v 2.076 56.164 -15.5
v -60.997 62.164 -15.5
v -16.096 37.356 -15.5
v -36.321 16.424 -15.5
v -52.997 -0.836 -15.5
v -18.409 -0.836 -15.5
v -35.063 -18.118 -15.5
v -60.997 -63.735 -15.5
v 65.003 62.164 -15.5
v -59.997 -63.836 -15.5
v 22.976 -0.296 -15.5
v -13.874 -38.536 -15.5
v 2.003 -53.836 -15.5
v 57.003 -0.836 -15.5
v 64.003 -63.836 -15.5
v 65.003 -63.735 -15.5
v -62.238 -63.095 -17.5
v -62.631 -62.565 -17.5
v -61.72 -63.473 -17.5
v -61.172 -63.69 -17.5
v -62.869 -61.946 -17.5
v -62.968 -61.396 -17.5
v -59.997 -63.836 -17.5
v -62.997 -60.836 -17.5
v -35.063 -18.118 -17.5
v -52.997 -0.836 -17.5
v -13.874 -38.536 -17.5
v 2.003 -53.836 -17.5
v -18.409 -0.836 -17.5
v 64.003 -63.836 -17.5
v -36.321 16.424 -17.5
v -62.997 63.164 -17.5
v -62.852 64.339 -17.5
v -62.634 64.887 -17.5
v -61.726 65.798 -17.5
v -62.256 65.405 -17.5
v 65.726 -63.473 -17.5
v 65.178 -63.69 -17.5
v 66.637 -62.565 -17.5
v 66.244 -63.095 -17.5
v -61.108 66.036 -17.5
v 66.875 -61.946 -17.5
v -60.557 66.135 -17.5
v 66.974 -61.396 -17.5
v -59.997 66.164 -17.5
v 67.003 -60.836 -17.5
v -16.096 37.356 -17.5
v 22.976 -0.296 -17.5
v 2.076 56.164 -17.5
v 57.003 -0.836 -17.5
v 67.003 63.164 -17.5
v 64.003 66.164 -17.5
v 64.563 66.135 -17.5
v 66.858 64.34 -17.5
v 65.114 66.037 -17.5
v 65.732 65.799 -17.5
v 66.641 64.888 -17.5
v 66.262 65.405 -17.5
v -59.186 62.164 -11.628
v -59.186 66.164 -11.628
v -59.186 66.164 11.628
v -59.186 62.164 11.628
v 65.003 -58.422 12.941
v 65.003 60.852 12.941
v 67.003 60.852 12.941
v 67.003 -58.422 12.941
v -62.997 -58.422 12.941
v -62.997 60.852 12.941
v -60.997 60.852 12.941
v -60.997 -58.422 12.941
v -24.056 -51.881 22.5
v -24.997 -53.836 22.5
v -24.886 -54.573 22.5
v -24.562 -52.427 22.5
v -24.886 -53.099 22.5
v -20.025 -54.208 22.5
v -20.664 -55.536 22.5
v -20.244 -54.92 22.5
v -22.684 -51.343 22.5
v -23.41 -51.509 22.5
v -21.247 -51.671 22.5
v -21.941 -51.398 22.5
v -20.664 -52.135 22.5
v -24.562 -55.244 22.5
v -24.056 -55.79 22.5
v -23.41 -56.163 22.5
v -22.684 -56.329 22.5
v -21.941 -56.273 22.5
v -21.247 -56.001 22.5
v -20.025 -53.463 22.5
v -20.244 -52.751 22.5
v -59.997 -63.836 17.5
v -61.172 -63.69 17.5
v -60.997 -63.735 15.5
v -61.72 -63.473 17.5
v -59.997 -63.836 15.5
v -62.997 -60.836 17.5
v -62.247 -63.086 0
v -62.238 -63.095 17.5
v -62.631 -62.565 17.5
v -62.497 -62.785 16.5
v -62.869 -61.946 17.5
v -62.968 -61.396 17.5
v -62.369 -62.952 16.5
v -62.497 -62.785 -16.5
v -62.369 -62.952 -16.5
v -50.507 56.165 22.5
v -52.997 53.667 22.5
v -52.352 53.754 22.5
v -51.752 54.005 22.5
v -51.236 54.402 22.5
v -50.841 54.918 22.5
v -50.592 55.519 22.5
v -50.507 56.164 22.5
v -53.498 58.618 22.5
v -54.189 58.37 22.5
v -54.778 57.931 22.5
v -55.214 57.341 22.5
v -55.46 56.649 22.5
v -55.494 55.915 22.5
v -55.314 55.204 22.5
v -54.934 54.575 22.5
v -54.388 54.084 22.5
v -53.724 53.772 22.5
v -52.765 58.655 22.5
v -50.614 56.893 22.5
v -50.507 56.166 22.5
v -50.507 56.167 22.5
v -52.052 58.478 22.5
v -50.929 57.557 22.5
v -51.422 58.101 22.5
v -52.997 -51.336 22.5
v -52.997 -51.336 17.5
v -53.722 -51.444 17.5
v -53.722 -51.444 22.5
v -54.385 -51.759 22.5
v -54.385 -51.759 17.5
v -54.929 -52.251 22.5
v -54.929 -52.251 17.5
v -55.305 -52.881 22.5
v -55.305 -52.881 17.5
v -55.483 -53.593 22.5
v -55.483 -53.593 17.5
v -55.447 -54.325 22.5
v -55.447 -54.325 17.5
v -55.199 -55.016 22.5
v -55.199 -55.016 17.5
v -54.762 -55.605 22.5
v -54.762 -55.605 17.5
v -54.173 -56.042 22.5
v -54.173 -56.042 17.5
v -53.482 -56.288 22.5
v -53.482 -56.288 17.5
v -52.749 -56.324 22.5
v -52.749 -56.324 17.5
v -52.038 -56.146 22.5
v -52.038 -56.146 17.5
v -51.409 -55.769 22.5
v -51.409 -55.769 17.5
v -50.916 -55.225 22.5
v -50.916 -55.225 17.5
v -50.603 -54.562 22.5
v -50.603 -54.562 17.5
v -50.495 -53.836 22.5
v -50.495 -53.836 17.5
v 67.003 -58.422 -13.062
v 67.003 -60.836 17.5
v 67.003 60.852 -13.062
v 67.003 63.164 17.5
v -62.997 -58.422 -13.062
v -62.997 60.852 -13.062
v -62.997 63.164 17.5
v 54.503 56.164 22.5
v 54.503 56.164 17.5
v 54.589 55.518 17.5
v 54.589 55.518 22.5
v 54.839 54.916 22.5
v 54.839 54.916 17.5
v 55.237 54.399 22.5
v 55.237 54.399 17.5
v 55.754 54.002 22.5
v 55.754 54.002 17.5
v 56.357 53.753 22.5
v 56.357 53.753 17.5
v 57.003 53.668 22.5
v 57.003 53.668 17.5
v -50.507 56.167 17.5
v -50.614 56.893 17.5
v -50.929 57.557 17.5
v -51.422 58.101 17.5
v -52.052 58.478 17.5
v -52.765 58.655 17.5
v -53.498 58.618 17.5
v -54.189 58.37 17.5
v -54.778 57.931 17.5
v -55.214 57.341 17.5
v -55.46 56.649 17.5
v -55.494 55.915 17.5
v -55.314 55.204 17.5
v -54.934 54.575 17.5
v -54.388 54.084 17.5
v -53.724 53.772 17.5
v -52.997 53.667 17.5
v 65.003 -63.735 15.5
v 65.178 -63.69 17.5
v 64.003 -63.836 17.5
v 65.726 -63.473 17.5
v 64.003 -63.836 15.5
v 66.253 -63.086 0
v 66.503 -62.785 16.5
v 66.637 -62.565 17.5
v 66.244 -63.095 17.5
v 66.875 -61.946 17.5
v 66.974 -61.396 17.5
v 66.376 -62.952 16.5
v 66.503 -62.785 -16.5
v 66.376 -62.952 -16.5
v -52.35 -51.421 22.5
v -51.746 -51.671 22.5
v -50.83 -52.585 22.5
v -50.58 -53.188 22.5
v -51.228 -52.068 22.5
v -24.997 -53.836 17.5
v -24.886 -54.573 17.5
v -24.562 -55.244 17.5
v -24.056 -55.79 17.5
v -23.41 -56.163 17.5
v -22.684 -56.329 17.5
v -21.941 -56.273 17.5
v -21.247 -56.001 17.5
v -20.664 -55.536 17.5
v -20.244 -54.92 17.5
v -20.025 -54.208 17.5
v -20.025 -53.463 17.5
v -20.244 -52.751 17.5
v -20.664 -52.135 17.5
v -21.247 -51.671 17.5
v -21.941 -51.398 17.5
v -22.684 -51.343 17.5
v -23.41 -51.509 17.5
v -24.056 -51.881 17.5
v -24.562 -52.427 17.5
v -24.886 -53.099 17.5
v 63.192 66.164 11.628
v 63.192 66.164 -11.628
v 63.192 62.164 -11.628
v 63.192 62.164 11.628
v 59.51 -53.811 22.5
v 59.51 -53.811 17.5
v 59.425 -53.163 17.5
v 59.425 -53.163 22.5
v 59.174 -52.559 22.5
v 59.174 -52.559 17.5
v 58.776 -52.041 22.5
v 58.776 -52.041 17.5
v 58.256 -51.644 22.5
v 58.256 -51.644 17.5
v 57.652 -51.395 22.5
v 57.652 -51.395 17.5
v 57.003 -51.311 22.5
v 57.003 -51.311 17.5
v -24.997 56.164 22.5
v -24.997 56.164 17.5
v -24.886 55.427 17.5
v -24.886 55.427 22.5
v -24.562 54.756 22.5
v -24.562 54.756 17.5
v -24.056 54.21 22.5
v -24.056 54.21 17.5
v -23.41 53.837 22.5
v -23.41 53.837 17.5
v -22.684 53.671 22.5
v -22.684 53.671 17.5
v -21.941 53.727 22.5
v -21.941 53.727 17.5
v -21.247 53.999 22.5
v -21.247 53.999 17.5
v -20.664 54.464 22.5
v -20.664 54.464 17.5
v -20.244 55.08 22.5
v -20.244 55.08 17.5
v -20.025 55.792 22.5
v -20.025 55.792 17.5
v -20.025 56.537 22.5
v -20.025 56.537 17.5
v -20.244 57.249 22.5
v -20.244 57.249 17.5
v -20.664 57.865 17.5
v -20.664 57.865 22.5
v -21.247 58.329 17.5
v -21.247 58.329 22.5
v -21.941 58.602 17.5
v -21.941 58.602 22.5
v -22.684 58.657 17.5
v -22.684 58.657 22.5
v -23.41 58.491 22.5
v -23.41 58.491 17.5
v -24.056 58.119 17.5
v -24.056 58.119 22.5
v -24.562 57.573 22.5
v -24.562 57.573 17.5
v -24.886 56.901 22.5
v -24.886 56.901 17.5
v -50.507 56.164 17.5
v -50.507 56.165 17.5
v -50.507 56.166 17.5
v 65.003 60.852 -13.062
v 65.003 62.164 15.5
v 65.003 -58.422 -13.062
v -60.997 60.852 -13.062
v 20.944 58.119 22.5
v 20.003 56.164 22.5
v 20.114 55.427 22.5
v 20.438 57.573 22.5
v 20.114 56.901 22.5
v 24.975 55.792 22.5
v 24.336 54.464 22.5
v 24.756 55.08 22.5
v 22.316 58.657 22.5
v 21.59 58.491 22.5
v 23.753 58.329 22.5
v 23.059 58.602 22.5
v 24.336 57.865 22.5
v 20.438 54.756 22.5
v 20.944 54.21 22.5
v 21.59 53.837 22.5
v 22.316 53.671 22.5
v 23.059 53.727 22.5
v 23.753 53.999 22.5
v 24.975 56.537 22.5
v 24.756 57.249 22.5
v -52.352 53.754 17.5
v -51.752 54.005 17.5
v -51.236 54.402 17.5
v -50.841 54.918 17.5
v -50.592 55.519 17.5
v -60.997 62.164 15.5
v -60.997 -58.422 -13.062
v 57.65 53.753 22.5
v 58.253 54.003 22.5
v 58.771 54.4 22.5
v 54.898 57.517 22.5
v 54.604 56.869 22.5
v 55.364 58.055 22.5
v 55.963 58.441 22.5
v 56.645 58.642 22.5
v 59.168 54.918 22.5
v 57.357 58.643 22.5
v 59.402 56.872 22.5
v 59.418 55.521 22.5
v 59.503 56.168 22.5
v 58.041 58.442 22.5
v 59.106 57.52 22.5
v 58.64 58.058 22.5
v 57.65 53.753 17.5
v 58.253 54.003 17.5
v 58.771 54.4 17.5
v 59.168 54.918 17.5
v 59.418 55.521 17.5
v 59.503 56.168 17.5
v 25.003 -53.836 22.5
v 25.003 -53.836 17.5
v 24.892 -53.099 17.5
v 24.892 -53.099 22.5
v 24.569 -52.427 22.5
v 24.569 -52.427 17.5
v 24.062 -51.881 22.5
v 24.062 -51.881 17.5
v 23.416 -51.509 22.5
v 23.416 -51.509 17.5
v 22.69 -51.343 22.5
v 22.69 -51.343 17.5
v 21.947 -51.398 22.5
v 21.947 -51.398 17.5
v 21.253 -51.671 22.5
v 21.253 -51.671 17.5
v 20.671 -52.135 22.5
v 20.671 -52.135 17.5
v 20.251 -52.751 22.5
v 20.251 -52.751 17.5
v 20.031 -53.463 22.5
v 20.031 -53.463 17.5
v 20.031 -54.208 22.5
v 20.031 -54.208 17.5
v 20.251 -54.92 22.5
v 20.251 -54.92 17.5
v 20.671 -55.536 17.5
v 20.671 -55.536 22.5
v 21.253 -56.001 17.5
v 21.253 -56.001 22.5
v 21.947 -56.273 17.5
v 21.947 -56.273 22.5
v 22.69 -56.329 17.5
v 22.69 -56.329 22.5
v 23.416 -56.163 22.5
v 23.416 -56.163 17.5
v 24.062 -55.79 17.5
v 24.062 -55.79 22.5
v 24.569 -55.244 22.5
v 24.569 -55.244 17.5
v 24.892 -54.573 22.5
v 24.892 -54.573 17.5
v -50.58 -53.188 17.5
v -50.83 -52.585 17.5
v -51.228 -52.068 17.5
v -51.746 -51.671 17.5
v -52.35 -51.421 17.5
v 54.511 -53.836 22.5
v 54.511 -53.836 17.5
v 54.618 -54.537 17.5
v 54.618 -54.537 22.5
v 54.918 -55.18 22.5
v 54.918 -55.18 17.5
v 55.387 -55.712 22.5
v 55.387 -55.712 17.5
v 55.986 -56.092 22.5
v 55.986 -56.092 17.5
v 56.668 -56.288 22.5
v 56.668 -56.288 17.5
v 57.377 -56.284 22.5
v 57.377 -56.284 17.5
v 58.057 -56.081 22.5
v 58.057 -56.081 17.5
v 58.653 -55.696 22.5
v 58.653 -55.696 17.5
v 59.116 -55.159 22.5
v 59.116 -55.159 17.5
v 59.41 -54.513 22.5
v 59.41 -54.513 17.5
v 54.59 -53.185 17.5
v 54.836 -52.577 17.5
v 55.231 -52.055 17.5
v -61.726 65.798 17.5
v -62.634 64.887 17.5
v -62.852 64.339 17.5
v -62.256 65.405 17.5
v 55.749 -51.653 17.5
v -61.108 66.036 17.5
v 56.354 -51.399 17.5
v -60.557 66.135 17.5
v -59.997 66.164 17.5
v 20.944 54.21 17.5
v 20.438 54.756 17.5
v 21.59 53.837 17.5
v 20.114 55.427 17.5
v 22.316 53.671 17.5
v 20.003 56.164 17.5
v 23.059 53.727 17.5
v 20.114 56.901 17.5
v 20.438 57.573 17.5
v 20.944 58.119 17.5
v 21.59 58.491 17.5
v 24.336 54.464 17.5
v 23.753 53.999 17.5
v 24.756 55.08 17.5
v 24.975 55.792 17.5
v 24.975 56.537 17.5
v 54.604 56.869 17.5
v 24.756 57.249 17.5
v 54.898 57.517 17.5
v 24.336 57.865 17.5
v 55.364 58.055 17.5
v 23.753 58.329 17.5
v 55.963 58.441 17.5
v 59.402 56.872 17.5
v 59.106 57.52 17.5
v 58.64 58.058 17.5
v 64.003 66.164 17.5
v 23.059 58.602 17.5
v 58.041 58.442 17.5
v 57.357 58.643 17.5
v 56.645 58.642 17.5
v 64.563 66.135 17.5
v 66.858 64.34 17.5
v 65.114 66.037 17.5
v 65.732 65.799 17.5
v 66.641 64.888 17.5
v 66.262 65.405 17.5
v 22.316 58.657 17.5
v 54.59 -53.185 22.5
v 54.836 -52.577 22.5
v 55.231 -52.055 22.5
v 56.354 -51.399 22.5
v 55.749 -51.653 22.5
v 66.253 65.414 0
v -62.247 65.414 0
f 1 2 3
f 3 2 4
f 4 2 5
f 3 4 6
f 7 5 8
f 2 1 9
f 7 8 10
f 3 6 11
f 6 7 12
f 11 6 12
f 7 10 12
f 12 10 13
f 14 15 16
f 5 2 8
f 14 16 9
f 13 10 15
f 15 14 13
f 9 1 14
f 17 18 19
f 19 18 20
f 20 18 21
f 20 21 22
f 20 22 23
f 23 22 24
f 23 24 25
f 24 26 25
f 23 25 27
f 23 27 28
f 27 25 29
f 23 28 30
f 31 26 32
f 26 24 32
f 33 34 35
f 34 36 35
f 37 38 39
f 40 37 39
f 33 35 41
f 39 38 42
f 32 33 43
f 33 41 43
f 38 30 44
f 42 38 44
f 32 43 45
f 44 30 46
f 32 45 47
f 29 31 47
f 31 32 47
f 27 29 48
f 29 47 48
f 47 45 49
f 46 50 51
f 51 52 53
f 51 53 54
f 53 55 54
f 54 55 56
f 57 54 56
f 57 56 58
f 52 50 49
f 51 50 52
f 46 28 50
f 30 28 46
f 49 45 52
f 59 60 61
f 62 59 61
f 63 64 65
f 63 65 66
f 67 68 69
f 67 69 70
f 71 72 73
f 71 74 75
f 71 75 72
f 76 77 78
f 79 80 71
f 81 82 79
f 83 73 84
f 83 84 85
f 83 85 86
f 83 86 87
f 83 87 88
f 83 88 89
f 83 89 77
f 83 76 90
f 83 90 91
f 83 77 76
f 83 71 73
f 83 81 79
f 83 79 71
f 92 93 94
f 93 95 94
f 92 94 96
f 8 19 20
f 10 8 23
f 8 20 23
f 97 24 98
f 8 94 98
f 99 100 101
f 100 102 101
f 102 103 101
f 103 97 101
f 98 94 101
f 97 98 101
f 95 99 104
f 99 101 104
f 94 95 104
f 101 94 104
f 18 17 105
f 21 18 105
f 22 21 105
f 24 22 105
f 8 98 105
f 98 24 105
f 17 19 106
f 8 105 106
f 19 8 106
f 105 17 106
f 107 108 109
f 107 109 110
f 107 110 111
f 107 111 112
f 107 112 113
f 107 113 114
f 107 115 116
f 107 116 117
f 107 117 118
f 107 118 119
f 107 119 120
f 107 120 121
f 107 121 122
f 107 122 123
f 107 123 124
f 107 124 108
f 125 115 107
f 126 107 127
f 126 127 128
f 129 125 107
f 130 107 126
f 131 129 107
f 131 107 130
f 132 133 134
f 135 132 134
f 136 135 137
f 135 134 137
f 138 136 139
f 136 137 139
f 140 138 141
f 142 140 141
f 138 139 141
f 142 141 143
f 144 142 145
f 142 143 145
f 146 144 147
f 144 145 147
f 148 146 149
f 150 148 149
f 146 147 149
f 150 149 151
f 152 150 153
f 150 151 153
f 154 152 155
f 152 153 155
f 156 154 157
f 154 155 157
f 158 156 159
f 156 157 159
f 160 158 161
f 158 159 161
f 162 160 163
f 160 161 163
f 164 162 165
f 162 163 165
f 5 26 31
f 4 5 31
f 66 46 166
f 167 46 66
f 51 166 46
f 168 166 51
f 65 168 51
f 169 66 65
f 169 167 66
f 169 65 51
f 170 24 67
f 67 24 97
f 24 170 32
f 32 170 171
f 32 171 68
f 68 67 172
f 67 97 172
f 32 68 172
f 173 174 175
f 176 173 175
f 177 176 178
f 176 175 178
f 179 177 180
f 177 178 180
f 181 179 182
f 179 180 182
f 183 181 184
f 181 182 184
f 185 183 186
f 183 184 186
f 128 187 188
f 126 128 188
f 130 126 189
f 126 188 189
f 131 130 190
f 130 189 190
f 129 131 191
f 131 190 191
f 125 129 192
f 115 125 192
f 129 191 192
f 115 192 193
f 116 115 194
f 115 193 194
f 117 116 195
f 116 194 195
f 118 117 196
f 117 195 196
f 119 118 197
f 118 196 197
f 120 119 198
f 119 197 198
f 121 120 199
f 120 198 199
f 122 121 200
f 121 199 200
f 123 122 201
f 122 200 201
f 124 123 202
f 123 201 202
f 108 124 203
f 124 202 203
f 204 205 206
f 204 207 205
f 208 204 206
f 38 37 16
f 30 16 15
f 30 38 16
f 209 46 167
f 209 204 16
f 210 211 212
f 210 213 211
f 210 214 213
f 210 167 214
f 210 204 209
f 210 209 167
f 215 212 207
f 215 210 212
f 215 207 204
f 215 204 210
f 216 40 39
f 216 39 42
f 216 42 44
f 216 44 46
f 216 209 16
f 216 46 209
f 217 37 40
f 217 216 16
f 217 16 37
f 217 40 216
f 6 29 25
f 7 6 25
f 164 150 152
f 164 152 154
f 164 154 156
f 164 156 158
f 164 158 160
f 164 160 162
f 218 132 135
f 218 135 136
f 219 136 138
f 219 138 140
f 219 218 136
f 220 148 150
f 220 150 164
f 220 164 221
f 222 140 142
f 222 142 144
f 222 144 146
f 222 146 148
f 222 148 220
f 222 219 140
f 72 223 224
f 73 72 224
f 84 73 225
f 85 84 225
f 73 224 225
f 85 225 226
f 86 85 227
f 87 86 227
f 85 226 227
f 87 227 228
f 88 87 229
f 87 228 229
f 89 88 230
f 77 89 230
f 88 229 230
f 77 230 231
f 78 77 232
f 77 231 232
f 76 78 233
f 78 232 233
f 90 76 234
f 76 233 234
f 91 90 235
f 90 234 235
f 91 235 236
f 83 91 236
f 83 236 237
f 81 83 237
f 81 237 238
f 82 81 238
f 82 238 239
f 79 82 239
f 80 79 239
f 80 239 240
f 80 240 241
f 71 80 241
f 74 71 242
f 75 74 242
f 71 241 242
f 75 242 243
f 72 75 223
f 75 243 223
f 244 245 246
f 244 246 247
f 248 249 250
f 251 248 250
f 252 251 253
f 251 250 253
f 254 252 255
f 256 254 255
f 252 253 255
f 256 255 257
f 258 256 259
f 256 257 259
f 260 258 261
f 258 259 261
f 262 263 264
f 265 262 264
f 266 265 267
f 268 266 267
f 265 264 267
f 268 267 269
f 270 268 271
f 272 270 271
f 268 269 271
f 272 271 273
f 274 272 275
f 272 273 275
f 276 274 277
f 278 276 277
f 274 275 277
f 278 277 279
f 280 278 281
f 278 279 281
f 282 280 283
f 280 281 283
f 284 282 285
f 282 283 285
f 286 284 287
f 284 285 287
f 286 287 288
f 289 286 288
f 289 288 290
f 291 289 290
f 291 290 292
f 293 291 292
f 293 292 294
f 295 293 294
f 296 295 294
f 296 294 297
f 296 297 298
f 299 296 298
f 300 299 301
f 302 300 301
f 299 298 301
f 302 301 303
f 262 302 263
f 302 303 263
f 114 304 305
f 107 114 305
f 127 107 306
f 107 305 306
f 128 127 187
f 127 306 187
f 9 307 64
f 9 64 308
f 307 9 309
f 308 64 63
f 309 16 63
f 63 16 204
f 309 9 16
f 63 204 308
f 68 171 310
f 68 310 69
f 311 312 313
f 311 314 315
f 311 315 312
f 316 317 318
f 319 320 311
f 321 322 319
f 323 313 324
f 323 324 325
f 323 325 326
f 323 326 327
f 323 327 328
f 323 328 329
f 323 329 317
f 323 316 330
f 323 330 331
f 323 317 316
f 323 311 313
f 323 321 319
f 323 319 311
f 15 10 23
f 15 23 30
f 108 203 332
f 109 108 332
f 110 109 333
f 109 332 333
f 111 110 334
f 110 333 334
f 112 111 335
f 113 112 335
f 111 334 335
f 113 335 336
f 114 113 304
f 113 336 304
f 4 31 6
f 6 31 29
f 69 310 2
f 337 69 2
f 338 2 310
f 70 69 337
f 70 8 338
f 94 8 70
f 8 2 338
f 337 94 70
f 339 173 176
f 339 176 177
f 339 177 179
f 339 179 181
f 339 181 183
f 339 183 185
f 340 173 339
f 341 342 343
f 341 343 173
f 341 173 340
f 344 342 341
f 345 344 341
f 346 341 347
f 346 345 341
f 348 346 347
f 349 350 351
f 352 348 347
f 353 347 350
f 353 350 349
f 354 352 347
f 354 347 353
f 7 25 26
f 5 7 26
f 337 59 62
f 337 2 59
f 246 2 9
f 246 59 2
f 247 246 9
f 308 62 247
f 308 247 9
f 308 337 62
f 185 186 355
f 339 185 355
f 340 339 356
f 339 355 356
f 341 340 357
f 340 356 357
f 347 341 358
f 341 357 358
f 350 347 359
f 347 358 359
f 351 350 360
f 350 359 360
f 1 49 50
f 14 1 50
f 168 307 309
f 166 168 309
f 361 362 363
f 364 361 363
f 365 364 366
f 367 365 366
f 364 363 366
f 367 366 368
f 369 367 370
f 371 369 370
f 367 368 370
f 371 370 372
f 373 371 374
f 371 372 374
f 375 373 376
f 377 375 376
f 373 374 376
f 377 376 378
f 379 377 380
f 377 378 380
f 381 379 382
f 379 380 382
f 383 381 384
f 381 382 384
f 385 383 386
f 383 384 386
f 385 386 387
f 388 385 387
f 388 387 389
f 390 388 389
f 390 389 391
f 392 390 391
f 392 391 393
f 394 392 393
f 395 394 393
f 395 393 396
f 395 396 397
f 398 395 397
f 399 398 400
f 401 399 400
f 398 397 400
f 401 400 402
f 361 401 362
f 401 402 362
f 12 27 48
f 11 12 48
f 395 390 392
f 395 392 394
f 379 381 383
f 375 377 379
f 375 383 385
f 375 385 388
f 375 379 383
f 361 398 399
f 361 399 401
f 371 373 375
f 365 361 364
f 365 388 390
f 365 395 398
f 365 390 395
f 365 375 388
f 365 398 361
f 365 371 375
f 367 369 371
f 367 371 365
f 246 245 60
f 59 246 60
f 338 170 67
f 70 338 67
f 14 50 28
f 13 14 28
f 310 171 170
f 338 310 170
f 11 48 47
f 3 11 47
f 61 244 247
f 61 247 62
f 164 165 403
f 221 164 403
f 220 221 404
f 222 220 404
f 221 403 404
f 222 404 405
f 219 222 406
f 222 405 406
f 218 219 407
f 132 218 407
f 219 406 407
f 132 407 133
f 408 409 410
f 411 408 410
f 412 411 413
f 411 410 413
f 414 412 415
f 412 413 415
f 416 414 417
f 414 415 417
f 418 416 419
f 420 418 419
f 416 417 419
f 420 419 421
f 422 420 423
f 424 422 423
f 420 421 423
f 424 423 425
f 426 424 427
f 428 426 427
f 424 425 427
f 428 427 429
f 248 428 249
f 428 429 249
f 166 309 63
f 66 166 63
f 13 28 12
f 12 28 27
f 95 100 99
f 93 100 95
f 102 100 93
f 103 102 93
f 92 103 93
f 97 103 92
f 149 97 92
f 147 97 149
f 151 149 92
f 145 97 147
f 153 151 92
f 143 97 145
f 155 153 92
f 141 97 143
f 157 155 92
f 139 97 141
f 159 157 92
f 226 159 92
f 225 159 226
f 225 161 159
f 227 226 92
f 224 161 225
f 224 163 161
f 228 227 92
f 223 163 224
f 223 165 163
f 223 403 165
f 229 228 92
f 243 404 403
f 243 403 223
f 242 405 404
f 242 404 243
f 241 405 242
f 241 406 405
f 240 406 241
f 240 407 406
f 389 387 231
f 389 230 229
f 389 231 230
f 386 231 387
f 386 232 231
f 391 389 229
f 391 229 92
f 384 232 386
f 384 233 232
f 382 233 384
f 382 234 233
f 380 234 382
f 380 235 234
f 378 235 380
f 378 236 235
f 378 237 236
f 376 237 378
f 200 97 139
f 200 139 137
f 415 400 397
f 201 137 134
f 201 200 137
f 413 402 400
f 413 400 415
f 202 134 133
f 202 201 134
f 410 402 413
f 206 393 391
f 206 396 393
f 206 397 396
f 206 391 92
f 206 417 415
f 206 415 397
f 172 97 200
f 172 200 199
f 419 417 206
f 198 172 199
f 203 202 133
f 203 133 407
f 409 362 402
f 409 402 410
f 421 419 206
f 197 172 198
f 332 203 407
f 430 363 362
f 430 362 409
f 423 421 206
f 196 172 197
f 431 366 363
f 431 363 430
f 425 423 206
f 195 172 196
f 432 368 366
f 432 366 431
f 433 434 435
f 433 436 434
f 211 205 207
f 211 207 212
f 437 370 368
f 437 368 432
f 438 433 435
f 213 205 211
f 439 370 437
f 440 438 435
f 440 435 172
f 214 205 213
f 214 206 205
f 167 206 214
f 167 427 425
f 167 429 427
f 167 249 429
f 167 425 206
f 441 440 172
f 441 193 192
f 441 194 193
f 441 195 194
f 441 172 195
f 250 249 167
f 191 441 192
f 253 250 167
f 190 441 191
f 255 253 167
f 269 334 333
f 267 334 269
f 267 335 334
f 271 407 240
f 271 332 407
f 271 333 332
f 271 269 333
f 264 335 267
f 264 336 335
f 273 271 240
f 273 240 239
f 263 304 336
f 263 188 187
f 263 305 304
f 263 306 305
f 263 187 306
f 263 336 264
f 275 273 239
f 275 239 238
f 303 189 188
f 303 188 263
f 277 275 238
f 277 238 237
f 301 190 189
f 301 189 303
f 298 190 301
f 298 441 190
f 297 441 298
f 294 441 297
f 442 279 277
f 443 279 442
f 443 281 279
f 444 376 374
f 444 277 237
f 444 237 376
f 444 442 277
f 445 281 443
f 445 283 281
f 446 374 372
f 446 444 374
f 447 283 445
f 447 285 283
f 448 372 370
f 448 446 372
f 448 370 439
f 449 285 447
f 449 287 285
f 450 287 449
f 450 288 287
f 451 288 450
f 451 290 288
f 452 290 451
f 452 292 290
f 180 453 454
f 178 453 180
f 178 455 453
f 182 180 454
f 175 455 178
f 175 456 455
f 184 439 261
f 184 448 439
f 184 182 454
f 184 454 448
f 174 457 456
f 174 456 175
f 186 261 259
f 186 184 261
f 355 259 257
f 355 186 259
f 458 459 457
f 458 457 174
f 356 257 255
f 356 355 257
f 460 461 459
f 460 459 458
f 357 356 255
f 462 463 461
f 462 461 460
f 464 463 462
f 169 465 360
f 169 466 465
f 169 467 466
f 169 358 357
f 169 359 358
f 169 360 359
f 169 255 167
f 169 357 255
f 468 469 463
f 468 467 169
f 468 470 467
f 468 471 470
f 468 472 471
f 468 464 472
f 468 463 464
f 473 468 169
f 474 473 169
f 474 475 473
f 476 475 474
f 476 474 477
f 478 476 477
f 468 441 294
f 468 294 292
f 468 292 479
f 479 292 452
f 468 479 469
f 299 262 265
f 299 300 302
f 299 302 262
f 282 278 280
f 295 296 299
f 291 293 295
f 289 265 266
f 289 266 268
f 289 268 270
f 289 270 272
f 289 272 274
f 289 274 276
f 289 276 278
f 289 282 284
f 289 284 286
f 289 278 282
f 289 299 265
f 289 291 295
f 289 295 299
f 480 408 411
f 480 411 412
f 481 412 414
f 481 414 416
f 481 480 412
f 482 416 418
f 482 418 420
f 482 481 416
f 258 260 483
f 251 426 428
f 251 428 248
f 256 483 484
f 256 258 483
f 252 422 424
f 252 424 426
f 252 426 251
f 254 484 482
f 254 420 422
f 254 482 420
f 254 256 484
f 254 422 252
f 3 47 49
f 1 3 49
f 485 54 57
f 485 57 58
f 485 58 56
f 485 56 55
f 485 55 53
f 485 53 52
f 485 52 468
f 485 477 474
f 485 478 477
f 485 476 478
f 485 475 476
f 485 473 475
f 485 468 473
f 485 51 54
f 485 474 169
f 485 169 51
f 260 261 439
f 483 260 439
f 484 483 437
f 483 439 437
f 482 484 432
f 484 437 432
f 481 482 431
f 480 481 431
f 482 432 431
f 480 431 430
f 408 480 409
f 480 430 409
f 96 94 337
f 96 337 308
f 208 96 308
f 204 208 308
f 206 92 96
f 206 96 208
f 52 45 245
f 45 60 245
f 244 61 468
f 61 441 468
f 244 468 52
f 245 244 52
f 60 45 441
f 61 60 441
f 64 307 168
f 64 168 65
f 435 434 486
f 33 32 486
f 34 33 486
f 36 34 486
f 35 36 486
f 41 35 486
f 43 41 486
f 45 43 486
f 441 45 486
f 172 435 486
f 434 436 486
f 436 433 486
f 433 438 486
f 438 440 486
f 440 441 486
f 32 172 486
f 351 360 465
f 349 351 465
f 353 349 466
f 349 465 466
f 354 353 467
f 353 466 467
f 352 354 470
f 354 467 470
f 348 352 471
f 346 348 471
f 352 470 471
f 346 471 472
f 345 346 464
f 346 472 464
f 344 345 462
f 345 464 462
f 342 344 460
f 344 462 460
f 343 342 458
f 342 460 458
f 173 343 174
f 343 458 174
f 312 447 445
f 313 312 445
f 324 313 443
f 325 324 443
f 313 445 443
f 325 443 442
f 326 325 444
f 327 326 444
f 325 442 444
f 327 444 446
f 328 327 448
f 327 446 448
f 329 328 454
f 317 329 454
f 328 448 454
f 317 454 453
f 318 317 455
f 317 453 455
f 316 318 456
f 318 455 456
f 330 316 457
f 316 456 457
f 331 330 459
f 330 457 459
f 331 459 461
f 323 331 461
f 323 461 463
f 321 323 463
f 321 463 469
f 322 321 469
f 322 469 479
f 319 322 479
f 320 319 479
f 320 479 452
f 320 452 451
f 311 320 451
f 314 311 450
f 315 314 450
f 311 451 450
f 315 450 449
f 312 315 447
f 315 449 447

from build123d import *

# Parameters (mm, degrees)
F0_W         = 130
F0_H         = 130
F1_DEPTH     = 17.5
F2_W         = 126
F2_H         = 31
F3_DEPTH     = 126
F5_DEPTH     = 5
F7_DEPTH     = 3
F9_W         = 122.3782406645
F9_H         = 23.2565429012
F10_DEPTH    = 7
F8_W         = 119.2743226562
F8_H         = 26.0036256061
F11_DEPTH    = 130
F12_T1_DEPTH = 50


# Not quite as in the source:
# - a fillet or chamfer that OpenCascade refuses, or shapes differently, is made with other operations: its cross-section is extruded or revolved along the edge and cut away or added


with BuildPart() as f1:
    # F0 (on Top) → F1 (new body, symmetric)
    with BuildSketch(Plane.XY):
        with Locations((2.0031377077, 1.1643140912)):
            Rectangle(F0_W, F0_H)
    extrude(amount=F1_DEPTH, both=True)

    # F2 (on face) → F3 (cut)
    with BuildSketch(Plane.XZ.offset(63.8356859088)):
        with Locations((2.0031377077, 0)):
            Rectangle(F2_W, F2_H)
    extrude(amount=-F3_DEPTH, mode=Mode.SUBTRACT)

    # F4 (on face) → F5 (join)
    with BuildSketch(Plane.XY.offset(17.5)):
        with BuildLine():
            Line((-24.9968622923, -53.8356859088), (-19.9968622923, -53.8356859088))
            ThreePointArc((-19.9968622923, -53.8356859088), (-22.4968622923, -51.3356859088), (-24.9968622923, -53.8356859088))
        make_face()
        with BuildLine():
            ThreePointArc((-24.9968622923, -53.8356859088), (-22.4968622923, -56.3356859088), (-19.9968622923, -53.8356859088))
            Line((-19.9968622923, -53.8356859088), (-24.9968622923, -53.8356859088))
        make_face()
        with BuildLine():
            ThreePointArc((-19.9968622923, 56.1643140912), (-22.4968622923, 58.6643140912), (-24.9968622923, 56.1643140912))
            Line((-24.9968622923, 56.1643140912), (-19.9968622923, 56.1643140912))
        make_face()
        with BuildLine():
            Line((-19.9968622923, 56.1643140912), (-24.9968622923, 56.1643140912))
            ThreePointArc((-24.9968622923, 56.1643140912), (-22.4968622923, 53.6643140912), (-19.9968622923, 56.1643140912))
        make_face()
        with BuildLine():
            Line((20.0031377077, 56.1643140912), (25.0031377077, 56.1643140912))
            ThreePointArc((25.0031377077, 56.1643140912), (22.5031377077, 58.6643140912), (20.0031377077, 56.1643140912))
        make_face()
        with BuildLine():
            ThreePointArc((20.0031377077, 56.1643140912), (22.5031377077, 53.6643140912), (25.0031377077, 56.1643140912))
            Line((25.0031377077, 56.1643140912), (20.0031377077, 56.1643140912))
        make_face()
        with BuildLine():
            Line((25.0031377077, -53.8356859088), (20.0031377077, -53.8356859088))
            ThreePointArc((20.0031377077, -53.8356859088), (22.5031377077, -56.3356859088), (25.0031377077, -53.8356859088))
        make_face()
        with BuildLine():
            ThreePointArc((25.0031377077, -53.8356859088), (22.5031377077, -51.3356859088), (20.0031377077, -53.8356859088))
            Line((20.0031377077, -53.8356859088), (25.0031377077, -53.8356859088))
        make_face()
        with BuildLine():
            ThreePointArc((54.5031400741, 56.1643140912), (55.2365873133, 54.3987711796), (57.0031377077, 53.6677538545))
            Line((57.0031377077, 53.6677538545), (57.0031377077, 56.1643140912))
            Line((57.0031377077, 56.1643140912), (54.5031400741, 56.1643140912))
        make_face()
        with BuildLine():
            Line((57.0031377077, 56.1643140912), (57.0031377077, 53.6677538545))
            ThreePointArc((57.0031377077, 53.6677538545), (58.7709046607, 54.3999869016), (59.5031377077, 56.1677538545))
            ThreePointArc((59.5031377077, 56.1677538545), (57.0014178256, 58.6677532629), (54.5031400741, 56.1643140912))
            Line((54.5031400741, 56.1643140912), (57.0031377077, 56.1643140912))
        make_face()
        with BuildLine():
            ThreePointArc((57.0031377077, -51.3110916167), (55.2314275833, -52.0546307181), (54.51056035, -53.8356859088))
            Line((54.51056035, -53.8356859088), (57.0031377077, -53.8356859088))
            Line((57.0031377077, -53.8356859088), (57.0031377077, -51.3110916167))
        make_face()
        with BuildLine():
            Line((57.0031377077, -53.8356859088), (54.51056035, -53.8356859088))
            ThreePointArc((54.51056035, -53.8356859088), (57.0227418926, -56.311050683), (59.5104392663, -53.8110809541))
            ThreePointArc((59.5104392663, -53.8110809541), (58.7756228408, -52.0407343925), (57.0031377077, -51.3110916167))
            Line((57.0031377077, -51.3110916167), (57.0031377077, -53.8356859088))
        make_face()
        with BuildLine():
            ThreePointArc((-50.4950310388, -53.8363249032), (-50.4950310593, -53.836005406), (-50.4950311205, -53.8356859088))
            Line((-50.4950311205, -53.8356859088), (-52.9968622923, -53.8356859088))
            Line((-52.9968622923, -53.8356859088), (-52.9968622923, -51.3363255739))
            ThreePointArc((-52.9968622923, -51.3363255739), (-54.7621504273, -55.6047391835), (-50.4950310388, -53.8363249032))
        make_face()
        with BuildLine():
            Line((-52.9968622923, -53.8356859088), (-50.4950311205, -53.8356859088))
            ThreePointArc((-50.4950311205, -53.8356859088), (-51.2281376662, -52.0676848015), (-52.9968622923, -51.3363255739))
            Line((-52.9968622923, -51.3363255739), (-52.9968622923, -53.8356859088))
        make_face()
        with BuildLine():
            Line((-52.9968622923, 56.1643140912), (-52.9968622923, 53.6671405204))
            ThreePointArc((-52.9968622923, 53.6671405204), (-51.2364160366, 54.4018236777), (-50.506650387, 56.1643140912))
            Line((-50.506650387, 56.1643140912), (-52.9968622923, 56.1643140912))
        make_face()
        with BuildLine():
            ThreePointArc((-50.5066488108, 56.1671213651), (-54.777872441, 57.9314248684), (-52.9968622923, 53.6671405204))
            Line((-52.9968622923, 53.6671405204), (-52.9968622923, 56.1643140912))
            Line((-52.9968622923, 56.1643140912), (-50.506650387, 56.1643140912))
            ThreePointArc((-50.506650387, 56.1643140912), (-50.5066492049, 56.1657177279), (-50.5066488108, 56.1671213651))
        make_face()
    extrude(amount=F5_DEPTH)

    # F6 (on face) → F7 (cut)
    with BuildSketch(Plane(origin=(0, 0, -17.5), x_dir=(1, 0, 0), z_dir=(0, 0, -1))):
        Polygon((57.0031377077, 0.8356859088), (2.0031377077, 53.8356859088), (-13.8737854376, 38.5361054233), (22.9762229292, 0.2955307031), (-16.0963200722, -37.3561925527), (2.0758649804, -56.1643140912), align=None)
        Polygon((-35.0628468777, 18.1175553083), (-52.9968622923, 0.8356859088), (-36.3205869987, -16.424176437), (-18.4094090927, 0.8356859088), align=None)
    extrude(amount=-F7_DEPTH, mode=Mode.SUBTRACT)

    # F9 (on face) → F10 (cut)
    with BuildSketch(Plane(origin=(0, 66.1643140912, 0), x_dir=(-1, 0, 0), z_dir=(0, 1, 0))):
        with Locations((-2.0031377077, 0)):
            Rectangle(F9_W, F9_H)
    extrude(amount=-F10_DEPTH, mode=Mode.SUBTRACT)

    # F8 (on face) → F11 (cut)
    with BuildSketch(Plane(origin=(-62.9968622923, 0, 0), x_dir=(0, -1, 0), z_dir=(-1, 0, 0))):
        with Locations((-1.2152138836, -0.0606838628)):
            Rectangle(F8_W, F8_H)
    extrude(amount=-F11_DEPTH, mode=Mode.SUBTRACT)

    # F12: fillet of radius 3 on 4 edges, made by hand

    # F12_s2 → F12_t1 (cut)
    with BuildSketch(Plane.XY.offset(-25)):
        with BuildLine():
            add(Edge.make_bspline(
                [(-59.9968622923, 66.1643140912), (-62.9968622923, 66.1643140912), (-62.9968622923, 63.1643140912)],
                knots=[0, 0, 0, 1, 1, 1], degree=2, weights=[1, 1, 1]))
            Line((-62.9968622923, 63.1643140912), (-62.9968622923, 66.1643140912))
            Line((-62.9968622923, 66.1643140912), (-59.9968622923, 66.1643140912))
        make_face()
        with BuildLine():
            add(Edge.make_bspline(
                [(-62.9968622923, -60.8356859088), (-62.9968622923, -63.8356859088), (-59.9968622923, -63.8356859088)],
                knots=[0, 0, 0, 1, 1, 1], degree=2, weights=[1, 1, 1]))
            Line((-59.9968622923, -63.8356859088), (-62.9968622923, -63.8356859088))
            Line((-62.9968622923, -63.8356859088), (-62.9968622923, -60.8356859088))
        make_face()
        with BuildLine():
            add(Edge.make_bspline(
                [(64.0031377077, 66.1643140912), (67.0031377077, 66.1643140912), (67.0031377077, 63.1643140912)],
                knots=[0, 0, 0, 1, 1, 1], degree=2, weights=[1, 1, 1]))
            Line((67.0031377077, 63.1643140912), (67.0031377077, 66.1643140912))
            Line((67.0031377077, 66.1643140912), (64.0031377077, 66.1643140912))
        make_face()
        with BuildLine():
            add(Edge.make_bspline(
                [(67.0031377077, -60.8356859088), (67.0031377077, -63.8356859088), (64.0031377077, -63.8356859088)],
                knots=[0, 0, 0, 1, 1, 1], degree=2, weights=[1, 1, 1]))
            Line((64.0031377077, -63.8356859088), (67.0031377077, -63.8356859088))
            Line((67.0031377077, -63.8356859088), (67.0031377077, -60.8356859088))
        make_face()
    extrude(amount=F12_T1_DEPTH, mode=Mode.SUBTRACT)


solid = f1.part
